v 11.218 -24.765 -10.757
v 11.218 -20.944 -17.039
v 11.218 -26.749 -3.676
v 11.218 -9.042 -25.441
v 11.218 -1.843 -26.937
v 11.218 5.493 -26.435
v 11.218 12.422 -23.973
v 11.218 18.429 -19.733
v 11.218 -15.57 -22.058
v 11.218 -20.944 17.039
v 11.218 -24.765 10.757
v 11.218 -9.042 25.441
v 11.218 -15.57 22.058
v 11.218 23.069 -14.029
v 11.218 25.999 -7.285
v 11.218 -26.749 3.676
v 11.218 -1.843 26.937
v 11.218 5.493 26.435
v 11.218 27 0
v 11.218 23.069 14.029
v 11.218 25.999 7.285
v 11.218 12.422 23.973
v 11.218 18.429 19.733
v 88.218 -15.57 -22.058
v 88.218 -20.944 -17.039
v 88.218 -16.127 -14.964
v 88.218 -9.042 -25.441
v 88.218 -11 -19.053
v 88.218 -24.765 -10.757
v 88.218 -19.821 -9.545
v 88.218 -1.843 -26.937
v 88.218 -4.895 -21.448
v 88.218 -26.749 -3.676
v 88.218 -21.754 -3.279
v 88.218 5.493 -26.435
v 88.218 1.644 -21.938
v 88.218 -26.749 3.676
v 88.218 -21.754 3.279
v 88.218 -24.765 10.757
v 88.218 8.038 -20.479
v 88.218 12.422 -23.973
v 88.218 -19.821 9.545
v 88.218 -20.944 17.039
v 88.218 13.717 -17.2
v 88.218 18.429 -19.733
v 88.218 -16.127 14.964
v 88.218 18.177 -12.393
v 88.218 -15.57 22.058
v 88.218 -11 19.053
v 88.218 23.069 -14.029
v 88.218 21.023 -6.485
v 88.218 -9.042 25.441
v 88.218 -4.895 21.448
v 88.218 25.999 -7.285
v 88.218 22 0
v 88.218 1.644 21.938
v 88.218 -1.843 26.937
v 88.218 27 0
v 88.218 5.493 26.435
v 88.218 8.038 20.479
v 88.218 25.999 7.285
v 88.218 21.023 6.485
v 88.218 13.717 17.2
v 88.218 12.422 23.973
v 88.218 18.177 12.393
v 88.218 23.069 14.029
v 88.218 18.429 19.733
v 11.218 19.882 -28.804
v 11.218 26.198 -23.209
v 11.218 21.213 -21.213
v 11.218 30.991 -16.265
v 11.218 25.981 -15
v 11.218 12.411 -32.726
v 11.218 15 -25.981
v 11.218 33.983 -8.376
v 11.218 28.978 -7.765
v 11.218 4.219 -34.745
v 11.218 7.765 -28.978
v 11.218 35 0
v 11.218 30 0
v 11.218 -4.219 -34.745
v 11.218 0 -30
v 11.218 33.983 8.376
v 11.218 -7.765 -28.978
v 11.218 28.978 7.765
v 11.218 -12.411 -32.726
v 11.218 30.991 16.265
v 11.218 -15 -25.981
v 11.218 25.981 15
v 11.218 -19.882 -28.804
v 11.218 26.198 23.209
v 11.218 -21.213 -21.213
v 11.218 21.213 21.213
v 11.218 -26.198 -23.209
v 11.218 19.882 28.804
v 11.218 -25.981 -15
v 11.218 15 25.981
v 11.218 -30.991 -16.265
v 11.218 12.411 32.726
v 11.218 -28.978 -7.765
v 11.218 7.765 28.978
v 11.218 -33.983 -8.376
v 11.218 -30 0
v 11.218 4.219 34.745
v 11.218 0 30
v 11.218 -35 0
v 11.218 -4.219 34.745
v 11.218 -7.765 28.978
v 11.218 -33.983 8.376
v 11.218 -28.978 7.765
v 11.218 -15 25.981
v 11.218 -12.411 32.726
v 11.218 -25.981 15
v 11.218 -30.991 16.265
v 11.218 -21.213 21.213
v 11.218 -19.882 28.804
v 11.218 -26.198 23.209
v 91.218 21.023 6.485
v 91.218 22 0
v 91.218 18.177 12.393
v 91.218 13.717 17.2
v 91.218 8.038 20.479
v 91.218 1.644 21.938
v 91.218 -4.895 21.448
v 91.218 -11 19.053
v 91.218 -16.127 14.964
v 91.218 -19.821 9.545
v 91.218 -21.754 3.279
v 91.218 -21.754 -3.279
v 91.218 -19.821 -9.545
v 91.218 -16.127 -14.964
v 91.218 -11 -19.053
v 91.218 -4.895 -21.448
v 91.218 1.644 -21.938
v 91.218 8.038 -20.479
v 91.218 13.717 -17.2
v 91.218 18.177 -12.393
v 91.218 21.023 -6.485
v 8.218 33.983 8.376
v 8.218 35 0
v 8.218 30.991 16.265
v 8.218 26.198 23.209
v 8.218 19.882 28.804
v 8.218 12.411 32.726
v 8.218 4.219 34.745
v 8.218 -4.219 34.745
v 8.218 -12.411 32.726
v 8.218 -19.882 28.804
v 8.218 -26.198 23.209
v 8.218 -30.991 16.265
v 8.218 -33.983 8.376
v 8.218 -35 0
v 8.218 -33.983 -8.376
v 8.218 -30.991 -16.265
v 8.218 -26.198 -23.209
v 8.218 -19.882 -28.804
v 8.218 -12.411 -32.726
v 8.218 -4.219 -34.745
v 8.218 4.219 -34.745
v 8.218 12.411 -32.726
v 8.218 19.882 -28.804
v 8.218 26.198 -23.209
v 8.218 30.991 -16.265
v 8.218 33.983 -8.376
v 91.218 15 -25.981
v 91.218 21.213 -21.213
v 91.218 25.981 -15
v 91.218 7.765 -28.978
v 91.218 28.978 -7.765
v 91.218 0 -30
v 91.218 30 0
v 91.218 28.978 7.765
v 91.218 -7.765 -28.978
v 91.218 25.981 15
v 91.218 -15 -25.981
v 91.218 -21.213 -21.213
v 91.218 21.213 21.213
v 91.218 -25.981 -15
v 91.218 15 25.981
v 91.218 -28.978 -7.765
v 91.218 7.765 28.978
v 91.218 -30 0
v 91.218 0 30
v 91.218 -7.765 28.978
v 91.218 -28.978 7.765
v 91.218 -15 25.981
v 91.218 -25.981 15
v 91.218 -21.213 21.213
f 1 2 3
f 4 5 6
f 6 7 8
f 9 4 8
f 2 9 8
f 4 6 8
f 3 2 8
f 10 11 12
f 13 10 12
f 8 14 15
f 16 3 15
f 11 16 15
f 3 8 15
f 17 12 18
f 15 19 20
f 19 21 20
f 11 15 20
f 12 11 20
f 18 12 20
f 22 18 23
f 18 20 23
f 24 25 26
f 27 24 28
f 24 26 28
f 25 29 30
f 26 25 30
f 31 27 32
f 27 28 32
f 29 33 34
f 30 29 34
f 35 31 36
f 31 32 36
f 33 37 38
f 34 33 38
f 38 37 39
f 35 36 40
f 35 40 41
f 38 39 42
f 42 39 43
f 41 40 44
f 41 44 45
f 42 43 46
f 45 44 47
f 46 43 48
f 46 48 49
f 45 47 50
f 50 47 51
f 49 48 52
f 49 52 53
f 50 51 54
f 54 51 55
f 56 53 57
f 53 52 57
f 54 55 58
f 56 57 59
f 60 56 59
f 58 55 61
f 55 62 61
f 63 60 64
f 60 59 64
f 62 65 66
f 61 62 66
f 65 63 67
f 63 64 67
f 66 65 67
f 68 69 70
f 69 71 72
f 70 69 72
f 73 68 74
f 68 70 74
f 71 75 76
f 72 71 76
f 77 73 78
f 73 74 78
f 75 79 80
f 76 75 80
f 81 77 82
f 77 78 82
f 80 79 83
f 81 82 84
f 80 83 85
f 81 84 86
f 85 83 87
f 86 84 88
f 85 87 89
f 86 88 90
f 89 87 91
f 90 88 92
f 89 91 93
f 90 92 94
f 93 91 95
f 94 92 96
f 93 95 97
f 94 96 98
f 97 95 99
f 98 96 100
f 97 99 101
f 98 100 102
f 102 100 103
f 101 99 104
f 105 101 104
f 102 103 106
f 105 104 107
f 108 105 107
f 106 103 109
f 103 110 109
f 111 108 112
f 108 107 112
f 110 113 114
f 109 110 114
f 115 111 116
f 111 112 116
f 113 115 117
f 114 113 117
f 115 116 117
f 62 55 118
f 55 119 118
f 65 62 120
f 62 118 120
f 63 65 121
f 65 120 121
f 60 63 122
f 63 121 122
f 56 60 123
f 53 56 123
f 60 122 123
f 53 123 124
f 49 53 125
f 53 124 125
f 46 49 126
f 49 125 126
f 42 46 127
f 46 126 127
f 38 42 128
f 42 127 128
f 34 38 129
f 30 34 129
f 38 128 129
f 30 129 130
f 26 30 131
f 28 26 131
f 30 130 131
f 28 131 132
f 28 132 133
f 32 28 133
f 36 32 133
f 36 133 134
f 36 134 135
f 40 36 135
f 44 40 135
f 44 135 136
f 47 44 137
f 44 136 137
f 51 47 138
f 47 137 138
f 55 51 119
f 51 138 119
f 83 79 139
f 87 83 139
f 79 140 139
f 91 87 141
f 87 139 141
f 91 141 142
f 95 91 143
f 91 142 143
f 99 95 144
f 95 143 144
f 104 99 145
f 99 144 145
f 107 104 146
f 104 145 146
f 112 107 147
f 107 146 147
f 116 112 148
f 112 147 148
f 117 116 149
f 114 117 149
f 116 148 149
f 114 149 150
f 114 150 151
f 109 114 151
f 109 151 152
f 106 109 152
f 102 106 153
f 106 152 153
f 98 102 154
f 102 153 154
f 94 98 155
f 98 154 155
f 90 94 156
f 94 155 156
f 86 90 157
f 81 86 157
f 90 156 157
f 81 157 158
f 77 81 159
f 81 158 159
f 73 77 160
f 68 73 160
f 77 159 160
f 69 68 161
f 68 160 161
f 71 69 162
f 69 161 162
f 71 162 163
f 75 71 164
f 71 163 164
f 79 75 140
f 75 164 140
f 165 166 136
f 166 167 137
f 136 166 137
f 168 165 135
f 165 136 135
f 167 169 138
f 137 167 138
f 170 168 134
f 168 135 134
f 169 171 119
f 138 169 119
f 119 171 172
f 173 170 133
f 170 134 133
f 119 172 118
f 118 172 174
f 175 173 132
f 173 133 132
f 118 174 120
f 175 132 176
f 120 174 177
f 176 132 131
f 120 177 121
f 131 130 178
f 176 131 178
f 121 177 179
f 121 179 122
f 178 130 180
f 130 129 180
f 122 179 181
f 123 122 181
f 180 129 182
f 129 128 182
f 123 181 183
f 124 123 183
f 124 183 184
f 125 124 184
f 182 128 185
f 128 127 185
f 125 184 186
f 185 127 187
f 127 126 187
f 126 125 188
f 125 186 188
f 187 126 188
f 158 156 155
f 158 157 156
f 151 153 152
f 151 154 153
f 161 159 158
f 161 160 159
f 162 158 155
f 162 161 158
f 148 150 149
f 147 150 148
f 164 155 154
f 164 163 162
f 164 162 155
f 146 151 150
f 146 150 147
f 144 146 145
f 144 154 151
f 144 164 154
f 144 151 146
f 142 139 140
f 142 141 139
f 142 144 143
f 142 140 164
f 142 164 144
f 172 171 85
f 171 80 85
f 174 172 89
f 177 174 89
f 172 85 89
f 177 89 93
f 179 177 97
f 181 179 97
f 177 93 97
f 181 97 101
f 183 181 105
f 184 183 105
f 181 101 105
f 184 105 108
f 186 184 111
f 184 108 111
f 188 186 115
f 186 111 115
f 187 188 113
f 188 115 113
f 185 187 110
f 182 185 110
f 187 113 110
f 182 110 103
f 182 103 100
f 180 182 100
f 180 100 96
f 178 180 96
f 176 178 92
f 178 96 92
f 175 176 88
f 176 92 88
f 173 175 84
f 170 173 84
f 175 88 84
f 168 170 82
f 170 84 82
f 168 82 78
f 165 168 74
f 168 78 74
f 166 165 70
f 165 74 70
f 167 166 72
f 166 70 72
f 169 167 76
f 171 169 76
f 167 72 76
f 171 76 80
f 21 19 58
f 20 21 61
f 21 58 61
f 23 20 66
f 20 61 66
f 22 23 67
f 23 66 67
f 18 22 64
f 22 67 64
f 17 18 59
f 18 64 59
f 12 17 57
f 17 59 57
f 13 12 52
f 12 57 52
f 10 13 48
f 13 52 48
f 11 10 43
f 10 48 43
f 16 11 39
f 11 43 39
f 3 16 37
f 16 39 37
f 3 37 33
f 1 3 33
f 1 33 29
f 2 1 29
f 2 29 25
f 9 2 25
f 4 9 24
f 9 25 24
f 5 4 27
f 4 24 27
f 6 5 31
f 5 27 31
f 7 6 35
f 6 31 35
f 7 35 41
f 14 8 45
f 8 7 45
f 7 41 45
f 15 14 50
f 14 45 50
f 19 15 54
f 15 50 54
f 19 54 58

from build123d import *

# Parameters (mm, degrees)
SKETCH2_R           = 27
BOSS_EXTRUDE1_DEPTH = 3


with BuildPart() as part:
    # Sketch1 → Revolve-Thin1 (revolve)
    with BuildSketch(Plane.XY):
        Polygon((8.218422341, 35), (8.218422341, 27), (88.218422341, 27), (88.218422341, 22), (91.218422341, 22), (91.218422341, 30), (11.218422341, 30), (11.218422341, 35), align=None)
    revolve(axis=Axis((0, 0, 0), (1, 0, 0)))

    # Sketch2 → Boss-Extrude1 (add)
    with BuildSketch(Plane.ZY.offset(-8.218422341)):
        Circle(SKETCH2_R)
    extrude(amount=-BOSS_EXTRUDE1_DEPTH)


solid = part.part
